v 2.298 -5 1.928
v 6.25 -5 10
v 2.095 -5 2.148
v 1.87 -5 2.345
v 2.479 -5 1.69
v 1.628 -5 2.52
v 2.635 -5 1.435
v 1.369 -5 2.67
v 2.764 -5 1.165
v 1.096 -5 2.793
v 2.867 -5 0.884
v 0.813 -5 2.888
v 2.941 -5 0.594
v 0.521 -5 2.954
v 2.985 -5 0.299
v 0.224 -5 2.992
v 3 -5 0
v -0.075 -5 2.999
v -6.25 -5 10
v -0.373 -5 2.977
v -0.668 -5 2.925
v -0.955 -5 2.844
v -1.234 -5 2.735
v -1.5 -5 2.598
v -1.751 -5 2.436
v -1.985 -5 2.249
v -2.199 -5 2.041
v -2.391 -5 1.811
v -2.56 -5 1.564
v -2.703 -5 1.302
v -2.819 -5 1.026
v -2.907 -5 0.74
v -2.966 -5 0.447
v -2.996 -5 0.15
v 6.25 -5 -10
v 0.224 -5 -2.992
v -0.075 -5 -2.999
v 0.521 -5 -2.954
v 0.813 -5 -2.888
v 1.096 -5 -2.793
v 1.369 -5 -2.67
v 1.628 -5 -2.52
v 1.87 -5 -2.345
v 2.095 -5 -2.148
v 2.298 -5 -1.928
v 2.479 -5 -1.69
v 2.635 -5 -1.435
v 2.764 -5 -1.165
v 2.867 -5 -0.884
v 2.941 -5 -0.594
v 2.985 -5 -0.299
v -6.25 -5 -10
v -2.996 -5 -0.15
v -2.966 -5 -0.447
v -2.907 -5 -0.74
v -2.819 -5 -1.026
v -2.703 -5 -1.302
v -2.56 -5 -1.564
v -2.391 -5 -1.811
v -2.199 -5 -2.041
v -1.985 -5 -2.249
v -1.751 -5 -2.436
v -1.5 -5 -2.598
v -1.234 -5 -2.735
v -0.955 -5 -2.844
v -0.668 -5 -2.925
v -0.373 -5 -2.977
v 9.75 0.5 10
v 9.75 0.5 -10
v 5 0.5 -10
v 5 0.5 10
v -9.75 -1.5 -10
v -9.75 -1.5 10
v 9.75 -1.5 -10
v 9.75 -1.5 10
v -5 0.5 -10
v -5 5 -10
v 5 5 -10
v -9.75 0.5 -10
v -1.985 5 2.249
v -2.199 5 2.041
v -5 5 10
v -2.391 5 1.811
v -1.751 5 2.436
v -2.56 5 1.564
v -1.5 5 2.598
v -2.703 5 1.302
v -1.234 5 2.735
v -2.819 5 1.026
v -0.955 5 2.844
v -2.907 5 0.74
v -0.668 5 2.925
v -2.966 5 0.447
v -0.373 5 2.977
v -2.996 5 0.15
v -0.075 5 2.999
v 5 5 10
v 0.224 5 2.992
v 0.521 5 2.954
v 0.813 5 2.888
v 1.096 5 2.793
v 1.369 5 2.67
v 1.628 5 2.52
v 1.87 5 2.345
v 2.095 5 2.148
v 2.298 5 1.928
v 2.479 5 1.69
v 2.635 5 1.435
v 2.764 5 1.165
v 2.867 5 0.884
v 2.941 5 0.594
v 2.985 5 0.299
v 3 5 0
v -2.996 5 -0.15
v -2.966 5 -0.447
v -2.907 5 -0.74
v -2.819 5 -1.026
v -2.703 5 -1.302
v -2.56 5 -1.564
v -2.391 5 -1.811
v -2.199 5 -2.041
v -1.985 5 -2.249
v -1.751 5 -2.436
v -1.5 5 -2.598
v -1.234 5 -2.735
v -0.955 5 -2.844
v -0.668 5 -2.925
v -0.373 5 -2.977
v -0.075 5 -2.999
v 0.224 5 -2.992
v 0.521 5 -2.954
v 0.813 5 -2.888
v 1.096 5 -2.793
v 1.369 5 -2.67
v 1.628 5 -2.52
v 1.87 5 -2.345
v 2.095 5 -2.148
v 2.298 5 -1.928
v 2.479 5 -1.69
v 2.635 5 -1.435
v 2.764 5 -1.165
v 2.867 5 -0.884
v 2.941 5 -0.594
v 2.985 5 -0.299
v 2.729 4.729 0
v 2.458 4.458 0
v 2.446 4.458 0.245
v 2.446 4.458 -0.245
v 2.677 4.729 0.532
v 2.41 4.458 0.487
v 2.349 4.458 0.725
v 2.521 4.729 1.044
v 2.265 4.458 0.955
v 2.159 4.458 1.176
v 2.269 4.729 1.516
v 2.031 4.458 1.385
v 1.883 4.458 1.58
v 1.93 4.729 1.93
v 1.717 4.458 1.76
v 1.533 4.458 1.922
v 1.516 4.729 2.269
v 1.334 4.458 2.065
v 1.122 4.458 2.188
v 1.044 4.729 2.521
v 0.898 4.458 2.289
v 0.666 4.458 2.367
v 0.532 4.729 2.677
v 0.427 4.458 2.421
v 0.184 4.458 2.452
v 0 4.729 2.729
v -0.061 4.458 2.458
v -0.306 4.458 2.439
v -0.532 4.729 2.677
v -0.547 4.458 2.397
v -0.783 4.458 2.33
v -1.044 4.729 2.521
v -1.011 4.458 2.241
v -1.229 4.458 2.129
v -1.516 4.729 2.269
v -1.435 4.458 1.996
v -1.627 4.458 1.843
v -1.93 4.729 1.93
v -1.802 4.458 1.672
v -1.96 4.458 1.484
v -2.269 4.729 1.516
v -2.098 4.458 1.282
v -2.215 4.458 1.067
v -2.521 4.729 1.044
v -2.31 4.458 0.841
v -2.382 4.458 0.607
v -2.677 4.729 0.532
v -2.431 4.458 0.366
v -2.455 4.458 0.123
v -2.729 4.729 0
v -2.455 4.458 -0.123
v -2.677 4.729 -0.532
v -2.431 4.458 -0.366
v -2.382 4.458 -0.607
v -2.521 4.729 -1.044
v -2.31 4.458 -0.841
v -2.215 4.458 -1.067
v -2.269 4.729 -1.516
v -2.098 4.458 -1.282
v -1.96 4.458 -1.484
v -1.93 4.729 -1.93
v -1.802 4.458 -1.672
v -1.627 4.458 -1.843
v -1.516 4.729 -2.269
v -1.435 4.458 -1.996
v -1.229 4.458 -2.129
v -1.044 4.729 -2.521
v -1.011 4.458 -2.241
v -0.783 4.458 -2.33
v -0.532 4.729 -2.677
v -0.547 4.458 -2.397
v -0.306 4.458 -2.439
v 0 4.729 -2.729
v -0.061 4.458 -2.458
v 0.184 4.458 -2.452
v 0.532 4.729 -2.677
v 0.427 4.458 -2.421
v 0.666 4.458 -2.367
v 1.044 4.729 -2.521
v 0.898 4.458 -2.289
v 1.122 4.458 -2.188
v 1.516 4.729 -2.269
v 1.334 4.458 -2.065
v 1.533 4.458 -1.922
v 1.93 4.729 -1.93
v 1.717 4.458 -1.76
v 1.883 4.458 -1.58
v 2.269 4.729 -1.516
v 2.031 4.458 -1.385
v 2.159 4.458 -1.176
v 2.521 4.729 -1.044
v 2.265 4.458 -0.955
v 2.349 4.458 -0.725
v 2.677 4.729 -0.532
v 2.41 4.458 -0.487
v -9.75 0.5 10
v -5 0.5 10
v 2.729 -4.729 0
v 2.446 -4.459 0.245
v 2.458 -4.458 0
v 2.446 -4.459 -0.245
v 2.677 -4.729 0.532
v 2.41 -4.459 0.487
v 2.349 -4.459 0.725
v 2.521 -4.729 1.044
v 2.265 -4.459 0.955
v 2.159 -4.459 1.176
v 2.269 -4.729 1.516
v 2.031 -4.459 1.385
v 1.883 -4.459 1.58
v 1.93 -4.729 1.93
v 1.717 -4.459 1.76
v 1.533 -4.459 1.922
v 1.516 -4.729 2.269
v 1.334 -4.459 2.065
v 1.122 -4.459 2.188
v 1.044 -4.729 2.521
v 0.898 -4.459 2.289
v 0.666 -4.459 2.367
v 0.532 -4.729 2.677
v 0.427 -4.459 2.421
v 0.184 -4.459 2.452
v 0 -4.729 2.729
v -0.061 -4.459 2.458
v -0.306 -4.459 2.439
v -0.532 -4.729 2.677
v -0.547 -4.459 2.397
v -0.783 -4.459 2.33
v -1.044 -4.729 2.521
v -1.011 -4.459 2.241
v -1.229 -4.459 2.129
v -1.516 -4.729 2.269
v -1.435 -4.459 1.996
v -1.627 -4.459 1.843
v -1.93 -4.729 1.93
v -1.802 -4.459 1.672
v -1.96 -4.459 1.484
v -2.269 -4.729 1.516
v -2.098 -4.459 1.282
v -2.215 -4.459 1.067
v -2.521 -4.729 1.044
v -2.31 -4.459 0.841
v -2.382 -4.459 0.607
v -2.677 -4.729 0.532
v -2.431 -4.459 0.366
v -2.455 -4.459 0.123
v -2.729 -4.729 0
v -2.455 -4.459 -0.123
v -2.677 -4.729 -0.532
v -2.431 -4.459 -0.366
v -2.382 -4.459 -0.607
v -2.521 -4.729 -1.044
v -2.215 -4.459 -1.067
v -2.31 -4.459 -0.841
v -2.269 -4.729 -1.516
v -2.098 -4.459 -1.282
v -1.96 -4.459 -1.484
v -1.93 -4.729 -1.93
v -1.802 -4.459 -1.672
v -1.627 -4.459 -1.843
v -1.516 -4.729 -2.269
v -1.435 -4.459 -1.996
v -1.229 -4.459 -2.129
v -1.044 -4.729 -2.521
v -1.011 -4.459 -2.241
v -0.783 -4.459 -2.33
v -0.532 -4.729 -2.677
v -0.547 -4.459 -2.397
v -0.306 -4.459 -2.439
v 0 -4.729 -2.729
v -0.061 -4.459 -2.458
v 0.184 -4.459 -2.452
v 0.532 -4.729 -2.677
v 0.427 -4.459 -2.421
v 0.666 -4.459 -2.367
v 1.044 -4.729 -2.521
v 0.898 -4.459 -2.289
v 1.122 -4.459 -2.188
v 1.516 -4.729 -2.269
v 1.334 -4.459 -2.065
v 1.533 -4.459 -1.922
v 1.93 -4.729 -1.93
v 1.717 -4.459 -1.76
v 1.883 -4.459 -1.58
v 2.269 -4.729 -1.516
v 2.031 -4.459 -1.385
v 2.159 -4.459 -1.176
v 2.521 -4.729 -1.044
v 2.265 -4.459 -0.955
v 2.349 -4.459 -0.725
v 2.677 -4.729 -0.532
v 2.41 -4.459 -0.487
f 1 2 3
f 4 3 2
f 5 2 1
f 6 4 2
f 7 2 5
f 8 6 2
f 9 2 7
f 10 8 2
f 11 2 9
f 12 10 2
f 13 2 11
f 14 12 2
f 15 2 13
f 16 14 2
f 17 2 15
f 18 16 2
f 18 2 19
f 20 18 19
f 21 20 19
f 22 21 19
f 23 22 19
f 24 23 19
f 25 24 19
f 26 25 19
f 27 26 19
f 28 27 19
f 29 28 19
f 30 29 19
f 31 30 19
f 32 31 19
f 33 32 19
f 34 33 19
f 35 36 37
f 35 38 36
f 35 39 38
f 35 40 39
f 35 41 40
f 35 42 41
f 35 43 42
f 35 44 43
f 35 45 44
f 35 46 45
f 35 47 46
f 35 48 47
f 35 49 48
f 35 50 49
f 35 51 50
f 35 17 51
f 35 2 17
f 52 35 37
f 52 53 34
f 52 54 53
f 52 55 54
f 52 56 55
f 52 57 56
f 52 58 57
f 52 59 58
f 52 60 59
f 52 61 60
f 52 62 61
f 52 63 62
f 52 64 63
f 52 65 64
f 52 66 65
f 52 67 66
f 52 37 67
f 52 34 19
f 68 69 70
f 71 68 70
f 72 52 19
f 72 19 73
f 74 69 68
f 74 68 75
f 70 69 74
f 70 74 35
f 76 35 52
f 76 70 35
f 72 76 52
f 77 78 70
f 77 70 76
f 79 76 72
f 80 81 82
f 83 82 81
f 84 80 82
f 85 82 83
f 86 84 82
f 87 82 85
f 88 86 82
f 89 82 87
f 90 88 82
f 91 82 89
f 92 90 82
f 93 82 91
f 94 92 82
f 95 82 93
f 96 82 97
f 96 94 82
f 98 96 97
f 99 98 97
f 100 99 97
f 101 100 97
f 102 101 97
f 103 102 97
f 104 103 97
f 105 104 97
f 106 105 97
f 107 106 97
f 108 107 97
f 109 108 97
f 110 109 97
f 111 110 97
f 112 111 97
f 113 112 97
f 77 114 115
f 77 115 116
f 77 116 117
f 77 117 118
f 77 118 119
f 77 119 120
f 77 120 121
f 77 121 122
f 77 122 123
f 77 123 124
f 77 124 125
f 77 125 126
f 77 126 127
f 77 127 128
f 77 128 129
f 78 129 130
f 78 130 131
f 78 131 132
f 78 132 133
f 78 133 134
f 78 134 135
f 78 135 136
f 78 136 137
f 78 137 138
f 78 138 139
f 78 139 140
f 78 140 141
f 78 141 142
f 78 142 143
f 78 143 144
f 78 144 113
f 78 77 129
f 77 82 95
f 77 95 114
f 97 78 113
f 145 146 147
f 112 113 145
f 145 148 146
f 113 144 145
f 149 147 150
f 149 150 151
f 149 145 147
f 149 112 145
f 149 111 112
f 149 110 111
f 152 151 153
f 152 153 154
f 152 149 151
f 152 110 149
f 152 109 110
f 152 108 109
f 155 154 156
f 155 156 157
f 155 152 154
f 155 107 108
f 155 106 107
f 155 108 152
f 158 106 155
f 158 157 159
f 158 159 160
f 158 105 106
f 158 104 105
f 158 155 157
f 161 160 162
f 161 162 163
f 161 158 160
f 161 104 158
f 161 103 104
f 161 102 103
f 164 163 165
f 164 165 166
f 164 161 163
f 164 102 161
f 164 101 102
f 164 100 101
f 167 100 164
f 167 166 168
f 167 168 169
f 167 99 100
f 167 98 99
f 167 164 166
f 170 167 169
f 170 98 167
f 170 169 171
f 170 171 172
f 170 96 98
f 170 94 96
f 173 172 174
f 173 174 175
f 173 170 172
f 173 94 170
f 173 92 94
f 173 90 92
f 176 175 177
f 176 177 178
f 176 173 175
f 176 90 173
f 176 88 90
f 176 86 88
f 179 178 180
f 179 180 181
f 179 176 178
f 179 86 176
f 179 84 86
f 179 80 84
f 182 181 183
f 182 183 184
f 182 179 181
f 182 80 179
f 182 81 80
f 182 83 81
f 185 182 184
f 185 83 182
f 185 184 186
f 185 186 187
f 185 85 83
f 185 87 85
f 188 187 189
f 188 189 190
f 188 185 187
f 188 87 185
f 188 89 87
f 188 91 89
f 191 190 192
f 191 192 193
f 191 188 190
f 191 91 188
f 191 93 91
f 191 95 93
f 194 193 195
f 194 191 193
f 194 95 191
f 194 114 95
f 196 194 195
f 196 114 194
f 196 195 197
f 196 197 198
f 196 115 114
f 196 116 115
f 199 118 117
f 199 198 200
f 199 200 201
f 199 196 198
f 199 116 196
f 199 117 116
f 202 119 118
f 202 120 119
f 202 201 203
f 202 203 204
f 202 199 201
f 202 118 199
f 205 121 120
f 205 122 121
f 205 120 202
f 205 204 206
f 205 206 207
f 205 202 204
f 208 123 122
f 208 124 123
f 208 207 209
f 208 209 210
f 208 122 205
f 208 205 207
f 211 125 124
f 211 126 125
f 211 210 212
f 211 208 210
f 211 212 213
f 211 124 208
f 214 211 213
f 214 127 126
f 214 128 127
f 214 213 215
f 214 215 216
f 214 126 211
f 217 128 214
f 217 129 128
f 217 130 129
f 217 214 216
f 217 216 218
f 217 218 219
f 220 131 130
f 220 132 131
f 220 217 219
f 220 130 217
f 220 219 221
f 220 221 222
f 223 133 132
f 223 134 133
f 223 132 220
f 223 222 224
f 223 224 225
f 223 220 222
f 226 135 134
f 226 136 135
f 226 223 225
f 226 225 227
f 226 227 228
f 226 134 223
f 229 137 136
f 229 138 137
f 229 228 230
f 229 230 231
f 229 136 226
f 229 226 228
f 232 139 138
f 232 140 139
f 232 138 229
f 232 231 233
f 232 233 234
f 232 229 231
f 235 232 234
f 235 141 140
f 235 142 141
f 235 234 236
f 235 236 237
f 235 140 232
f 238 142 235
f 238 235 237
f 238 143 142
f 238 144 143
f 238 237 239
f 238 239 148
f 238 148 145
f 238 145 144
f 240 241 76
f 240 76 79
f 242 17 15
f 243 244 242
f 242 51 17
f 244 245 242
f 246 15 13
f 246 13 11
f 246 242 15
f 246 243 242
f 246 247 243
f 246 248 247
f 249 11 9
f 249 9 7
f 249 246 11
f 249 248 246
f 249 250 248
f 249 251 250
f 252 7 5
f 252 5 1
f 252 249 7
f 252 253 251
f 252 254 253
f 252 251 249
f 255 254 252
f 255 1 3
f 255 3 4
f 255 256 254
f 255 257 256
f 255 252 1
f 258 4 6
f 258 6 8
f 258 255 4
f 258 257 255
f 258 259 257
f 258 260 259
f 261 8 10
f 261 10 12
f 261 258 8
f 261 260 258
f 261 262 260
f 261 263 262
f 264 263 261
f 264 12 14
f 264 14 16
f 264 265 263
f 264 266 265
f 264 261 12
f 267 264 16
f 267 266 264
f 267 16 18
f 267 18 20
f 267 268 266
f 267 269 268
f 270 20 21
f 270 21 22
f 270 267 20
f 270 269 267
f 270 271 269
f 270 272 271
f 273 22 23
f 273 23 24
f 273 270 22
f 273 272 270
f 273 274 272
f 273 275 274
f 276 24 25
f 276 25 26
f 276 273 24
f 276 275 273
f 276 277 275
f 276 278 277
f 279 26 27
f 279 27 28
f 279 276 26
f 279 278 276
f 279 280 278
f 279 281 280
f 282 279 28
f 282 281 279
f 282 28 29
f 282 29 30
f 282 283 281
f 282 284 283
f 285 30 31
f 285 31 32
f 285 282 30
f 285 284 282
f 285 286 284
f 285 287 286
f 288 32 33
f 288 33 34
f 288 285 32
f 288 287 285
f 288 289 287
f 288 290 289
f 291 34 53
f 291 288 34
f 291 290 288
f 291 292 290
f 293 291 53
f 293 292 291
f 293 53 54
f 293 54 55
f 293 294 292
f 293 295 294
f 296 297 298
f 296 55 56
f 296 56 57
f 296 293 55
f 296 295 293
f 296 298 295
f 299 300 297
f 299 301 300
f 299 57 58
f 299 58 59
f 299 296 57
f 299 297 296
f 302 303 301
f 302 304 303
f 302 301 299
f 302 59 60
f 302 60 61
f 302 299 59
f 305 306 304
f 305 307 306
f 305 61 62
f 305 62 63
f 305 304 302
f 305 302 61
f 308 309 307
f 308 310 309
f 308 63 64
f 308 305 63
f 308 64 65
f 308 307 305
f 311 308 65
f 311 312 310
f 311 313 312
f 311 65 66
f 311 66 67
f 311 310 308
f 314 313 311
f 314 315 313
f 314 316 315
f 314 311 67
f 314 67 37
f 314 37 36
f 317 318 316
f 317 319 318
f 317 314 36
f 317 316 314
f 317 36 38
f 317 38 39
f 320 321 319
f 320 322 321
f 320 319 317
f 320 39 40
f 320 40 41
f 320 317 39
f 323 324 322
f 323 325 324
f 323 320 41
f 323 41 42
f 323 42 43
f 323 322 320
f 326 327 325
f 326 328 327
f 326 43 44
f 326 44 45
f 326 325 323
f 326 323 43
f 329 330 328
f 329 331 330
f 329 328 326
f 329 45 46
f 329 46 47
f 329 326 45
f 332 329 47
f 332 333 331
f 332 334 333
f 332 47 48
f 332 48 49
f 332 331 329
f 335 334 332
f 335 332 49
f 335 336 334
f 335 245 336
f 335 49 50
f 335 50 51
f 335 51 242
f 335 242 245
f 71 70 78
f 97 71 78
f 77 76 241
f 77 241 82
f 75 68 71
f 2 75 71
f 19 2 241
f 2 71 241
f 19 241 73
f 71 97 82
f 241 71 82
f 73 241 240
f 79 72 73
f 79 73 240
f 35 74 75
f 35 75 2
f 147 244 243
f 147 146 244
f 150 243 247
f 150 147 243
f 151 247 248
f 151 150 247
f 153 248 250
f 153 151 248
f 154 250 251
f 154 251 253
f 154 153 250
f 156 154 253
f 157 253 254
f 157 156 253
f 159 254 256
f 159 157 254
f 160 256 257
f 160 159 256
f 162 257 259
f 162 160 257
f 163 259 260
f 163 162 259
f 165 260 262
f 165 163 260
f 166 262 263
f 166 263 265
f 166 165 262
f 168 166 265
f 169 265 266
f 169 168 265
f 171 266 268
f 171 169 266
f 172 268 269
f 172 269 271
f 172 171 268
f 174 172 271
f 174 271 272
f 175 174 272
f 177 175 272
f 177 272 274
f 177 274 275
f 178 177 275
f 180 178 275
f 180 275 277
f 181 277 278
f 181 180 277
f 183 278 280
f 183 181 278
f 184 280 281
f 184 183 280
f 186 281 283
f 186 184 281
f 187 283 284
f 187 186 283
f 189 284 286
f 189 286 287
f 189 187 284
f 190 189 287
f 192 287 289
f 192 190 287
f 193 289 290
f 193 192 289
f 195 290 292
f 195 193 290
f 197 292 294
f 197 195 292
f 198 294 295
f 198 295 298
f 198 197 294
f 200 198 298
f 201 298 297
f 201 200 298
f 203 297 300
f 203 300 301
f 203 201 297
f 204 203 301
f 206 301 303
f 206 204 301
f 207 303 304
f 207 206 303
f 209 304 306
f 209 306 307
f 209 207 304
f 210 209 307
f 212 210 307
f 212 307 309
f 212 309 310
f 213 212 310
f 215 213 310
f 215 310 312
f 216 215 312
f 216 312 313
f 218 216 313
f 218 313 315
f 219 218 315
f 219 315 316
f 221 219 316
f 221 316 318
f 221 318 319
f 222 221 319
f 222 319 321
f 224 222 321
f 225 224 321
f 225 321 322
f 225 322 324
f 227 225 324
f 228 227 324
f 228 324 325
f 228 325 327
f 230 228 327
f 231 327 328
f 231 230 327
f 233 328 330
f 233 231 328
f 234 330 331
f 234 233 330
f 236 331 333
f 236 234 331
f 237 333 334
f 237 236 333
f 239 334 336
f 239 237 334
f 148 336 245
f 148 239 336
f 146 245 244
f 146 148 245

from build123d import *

# Parameters (mm, degrees)
BOSS_EXTRU_1_DEPTH      = 20
ESQUISSE2_W             = 4.75
ESQUISSE2_H             = 4.5
ENL_V_MAT_EXTRU_1_DEPTH = 21
ESQUISSE3_W             = 4.75
ESQUISSE3_H             = 4.5
ENL_V_MAT_EXTRU_2_DEPTH = 21


with BuildPart() as part:
    # Esquisse1 → Boss.-Extru.1 (new body)
    with BuildSketch(Plane(origin=(0, 0, -10), x_dir=(-1, 0, 0), z_dir=(0, 0, -1))):
        Polygon((9.75, -1.5), (9.75, 5), (-9.75, 5), (-9.75, -1.5), (-6.25, -5), (6.25, -5), align=None)
    extrude(amount=-BOSS_EXTRU_1_DEPTH)

    # Esquisse2 → Enlèv. mat.-Extru.1 (cut, through all)
    with BuildSketch(Plane(origin=(0, 0, -10), x_dir=(-1, 0, 0), z_dir=(0, 0, -1))):
        with Locations((-7.375, 2.75)):
            Rectangle(ESQUISSE2_W, ESQUISSE2_H)
    extrude(amount=-ENL_V_MAT_EXTRU_1_DEPTH, mode=Mode.SUBTRACT)

    # Esquisse3 → Enlèv. mat.-Extru.2 (cut, through all)
    with BuildSketch(Plane(origin=(0, 0, -10), x_dir=(-1, 0, 0), z_dir=(0, 0, -1))):
        with Locations((7.375, 2.75)):
            Rectangle(ESQUISSE3_W, ESQUISSE3_H)
    extrude(amount=-ENL_V_MAT_EXTRU_2_DEPTH, mode=Mode.SUBTRACT)

    # Esquisse4 → Enlèvement de matière-Révolution1 (revolve, cut)
    with BuildSketch(Plane.XY):
        Polygon((3, 5), (0, 5), (0, -5), (3, -5), (2.4585, -4.4585), (2.4585, 4.4585), align=None)
    revolve(axis=Axis((0, 5, 0), (0, -1, 0)), mode=Mode.SUBTRACT)


solid = part.part
